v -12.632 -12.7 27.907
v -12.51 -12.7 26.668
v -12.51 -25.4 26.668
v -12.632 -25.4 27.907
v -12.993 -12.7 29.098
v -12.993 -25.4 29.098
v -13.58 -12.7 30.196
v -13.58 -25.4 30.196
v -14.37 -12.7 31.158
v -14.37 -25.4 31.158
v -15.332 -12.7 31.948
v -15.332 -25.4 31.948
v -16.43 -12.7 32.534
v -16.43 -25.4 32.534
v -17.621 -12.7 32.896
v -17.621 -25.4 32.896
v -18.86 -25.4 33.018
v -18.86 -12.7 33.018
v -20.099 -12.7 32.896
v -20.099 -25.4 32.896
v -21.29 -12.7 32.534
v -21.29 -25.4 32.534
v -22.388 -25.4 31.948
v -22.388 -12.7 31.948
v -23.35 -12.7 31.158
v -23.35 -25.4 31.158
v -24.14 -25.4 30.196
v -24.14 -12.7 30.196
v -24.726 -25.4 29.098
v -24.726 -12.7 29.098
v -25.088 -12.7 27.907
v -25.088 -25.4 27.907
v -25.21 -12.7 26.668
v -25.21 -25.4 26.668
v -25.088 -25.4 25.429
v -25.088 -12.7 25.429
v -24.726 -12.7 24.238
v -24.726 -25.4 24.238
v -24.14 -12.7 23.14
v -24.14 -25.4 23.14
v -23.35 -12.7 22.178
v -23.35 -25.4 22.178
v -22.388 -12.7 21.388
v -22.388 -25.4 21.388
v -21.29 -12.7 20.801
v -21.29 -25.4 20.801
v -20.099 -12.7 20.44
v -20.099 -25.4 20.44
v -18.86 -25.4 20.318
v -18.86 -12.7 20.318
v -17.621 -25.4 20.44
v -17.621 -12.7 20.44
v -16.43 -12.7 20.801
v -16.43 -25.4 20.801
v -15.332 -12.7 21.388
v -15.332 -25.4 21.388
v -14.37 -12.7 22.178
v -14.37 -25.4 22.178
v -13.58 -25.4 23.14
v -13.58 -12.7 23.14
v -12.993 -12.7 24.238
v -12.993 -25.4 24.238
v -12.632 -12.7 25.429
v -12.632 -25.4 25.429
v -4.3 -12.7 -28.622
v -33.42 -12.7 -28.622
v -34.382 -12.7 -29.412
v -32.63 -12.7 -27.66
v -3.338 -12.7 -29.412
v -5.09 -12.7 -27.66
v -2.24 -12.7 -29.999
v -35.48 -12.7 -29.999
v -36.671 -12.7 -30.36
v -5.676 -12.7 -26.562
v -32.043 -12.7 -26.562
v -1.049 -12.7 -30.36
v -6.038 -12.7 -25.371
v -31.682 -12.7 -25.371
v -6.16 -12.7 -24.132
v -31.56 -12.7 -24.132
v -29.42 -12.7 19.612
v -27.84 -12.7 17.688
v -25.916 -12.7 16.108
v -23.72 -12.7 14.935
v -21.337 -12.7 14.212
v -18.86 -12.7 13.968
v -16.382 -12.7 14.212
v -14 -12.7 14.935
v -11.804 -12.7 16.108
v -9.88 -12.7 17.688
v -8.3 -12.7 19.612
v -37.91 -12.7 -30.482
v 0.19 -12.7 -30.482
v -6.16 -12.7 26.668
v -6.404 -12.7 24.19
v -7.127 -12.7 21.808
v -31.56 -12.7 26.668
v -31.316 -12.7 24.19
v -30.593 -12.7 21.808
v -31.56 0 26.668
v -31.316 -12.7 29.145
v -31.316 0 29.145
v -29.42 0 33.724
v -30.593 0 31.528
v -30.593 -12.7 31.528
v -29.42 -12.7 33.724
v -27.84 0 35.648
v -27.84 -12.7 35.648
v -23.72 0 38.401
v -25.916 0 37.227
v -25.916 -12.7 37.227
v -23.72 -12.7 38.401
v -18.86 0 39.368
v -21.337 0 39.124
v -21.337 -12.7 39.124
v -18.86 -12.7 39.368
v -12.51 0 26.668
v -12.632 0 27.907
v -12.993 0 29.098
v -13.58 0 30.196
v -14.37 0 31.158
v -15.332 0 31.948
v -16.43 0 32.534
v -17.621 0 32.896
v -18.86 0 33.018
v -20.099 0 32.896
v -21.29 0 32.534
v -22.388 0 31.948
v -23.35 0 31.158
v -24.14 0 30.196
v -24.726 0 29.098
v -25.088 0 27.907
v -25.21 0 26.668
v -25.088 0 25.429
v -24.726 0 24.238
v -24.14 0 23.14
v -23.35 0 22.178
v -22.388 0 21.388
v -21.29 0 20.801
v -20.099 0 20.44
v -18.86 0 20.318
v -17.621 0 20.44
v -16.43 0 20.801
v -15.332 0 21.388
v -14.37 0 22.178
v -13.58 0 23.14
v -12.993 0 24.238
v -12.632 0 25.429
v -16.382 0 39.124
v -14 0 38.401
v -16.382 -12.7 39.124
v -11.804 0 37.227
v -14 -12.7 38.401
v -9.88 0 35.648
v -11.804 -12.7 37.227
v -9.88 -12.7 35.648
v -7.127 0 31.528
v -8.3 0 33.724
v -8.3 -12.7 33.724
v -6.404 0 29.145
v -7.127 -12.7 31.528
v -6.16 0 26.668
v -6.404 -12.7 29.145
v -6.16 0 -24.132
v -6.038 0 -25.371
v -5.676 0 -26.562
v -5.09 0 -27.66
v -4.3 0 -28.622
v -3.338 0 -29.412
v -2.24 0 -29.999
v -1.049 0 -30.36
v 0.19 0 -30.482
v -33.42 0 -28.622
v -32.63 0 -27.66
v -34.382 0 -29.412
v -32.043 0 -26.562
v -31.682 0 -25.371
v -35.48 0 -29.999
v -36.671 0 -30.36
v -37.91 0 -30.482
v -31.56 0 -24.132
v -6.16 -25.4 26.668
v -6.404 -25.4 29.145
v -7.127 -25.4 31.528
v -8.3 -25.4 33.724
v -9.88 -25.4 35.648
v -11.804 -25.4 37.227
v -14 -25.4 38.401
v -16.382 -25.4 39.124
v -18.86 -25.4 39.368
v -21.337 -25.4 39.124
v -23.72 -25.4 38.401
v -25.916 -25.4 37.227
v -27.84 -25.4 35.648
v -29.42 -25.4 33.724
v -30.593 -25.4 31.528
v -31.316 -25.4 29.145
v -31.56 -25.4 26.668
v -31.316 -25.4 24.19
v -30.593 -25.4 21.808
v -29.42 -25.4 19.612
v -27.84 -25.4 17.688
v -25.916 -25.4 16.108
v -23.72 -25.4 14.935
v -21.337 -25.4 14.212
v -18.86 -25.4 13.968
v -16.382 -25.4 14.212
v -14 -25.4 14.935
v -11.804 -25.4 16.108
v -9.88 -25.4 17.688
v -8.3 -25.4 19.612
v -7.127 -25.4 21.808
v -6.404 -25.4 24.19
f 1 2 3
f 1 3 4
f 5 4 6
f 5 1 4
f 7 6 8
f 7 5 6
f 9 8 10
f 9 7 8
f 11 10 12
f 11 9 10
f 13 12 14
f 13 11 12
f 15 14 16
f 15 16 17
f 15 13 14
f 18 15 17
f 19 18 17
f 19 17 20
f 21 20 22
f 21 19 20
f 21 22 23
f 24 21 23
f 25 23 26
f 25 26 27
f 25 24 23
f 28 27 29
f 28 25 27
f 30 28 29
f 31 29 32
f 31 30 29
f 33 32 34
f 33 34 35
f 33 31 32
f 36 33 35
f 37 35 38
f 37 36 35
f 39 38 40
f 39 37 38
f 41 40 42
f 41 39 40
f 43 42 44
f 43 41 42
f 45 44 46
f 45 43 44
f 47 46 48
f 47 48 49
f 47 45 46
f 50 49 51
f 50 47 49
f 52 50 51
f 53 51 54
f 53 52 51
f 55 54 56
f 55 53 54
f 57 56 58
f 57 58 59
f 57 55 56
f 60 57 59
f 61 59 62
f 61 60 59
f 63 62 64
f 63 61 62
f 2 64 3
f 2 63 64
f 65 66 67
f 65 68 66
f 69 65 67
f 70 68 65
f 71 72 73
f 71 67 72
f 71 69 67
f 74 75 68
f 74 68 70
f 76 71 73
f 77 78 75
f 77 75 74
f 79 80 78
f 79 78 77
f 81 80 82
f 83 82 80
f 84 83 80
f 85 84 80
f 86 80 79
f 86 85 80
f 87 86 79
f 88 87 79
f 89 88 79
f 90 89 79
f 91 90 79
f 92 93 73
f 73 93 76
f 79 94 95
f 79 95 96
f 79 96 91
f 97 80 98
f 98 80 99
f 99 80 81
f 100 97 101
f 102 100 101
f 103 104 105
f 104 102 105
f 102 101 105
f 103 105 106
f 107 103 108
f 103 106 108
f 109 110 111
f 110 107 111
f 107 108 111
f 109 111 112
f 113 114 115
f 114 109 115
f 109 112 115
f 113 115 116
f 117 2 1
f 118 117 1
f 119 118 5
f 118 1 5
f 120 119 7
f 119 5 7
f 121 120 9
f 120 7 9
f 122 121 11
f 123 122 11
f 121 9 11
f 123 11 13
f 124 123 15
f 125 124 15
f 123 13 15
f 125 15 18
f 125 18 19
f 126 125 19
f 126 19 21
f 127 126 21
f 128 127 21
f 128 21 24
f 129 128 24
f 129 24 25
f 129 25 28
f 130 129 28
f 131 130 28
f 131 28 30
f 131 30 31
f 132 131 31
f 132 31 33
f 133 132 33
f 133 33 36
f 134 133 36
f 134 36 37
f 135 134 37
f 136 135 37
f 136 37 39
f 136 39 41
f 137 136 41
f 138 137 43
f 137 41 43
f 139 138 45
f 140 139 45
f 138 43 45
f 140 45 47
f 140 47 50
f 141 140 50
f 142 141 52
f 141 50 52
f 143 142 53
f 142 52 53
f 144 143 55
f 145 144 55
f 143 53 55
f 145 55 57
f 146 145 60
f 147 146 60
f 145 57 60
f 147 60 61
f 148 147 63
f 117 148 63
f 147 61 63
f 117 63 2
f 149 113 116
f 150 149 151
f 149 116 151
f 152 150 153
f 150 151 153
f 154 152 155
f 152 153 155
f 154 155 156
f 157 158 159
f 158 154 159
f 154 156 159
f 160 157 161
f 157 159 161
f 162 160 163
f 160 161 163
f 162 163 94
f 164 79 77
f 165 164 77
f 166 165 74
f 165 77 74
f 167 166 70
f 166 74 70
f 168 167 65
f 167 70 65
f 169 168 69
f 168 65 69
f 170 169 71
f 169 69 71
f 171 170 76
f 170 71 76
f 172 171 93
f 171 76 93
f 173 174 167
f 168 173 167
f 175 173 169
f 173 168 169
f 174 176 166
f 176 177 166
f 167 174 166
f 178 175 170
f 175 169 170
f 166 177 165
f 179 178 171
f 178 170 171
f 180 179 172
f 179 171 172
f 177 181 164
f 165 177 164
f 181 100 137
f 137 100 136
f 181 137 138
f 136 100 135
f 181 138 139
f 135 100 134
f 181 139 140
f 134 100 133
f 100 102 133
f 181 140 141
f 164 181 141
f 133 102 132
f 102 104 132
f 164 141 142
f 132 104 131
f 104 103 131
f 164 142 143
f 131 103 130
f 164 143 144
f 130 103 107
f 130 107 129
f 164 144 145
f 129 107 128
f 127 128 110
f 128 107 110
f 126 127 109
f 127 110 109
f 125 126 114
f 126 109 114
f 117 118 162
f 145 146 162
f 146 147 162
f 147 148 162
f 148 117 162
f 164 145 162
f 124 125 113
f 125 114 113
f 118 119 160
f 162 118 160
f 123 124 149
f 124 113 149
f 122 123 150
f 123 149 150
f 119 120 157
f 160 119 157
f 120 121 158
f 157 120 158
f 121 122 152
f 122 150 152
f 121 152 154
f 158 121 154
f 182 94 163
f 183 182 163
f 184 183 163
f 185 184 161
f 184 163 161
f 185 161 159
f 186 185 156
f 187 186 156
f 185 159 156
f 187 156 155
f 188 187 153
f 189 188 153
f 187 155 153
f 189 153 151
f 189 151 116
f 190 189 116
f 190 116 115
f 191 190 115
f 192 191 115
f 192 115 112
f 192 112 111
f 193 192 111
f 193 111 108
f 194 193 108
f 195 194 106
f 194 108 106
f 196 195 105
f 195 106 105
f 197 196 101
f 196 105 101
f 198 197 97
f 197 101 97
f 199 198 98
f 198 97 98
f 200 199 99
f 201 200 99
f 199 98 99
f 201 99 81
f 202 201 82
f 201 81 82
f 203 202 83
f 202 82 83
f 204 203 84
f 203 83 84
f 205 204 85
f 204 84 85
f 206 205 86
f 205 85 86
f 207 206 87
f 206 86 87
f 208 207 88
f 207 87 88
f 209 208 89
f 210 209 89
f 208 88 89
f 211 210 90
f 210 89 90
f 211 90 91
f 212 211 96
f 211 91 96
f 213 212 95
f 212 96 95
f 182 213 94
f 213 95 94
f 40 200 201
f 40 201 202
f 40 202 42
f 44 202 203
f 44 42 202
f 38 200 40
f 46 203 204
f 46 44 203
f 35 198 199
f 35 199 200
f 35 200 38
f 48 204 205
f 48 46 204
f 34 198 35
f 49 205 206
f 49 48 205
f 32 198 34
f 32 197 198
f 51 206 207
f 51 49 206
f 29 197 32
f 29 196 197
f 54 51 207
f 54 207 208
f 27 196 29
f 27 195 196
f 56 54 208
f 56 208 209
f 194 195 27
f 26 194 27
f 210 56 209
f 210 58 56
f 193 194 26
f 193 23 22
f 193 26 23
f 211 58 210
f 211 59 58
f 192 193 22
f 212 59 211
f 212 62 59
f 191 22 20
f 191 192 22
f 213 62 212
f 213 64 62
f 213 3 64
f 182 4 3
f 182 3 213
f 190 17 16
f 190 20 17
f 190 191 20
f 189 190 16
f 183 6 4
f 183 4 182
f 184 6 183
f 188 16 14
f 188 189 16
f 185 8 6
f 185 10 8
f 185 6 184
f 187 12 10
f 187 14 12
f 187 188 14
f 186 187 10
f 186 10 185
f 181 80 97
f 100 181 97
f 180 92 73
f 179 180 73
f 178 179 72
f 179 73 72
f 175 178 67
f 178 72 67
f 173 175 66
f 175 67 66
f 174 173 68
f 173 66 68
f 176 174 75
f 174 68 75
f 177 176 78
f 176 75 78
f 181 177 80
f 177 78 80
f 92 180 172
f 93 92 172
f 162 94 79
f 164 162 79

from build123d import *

# Parameters (mm, degrees)
F0_W     = 50.8
F0_H     = 69.85
F1_DEPTH = 12.7
F2_R     = 6.35
F3_DEPTH = 31.75
F4_DEPTH = 12.7


with BuildPart() as f1:
    # F0 (on Front) → F1 (new body)
    with BuildSketch(Plane.XZ):
        with Locations((-18.859848, 4.442824)):
            Rectangle(F0_W, F0_H)
    extrude(amount=F1_DEPTH)

    # F2 (on face) → F3 (cut)
    with BuildSketch(Plane.XZ.offset(12.7)):
        with BuildLine():
            Line((-31.559848, -24.132176), (-31.559848, 26.667824))
            ThreePointArc((-31.559848, 26.667824), (-27.840104, 35.64808), (-18.859848, 39.367824))
            Line((-18.859848, 39.367824), (-44.259848, 39.367824))
            Line((-44.259848, 39.367824), (-44.259848, -30.482176))
            Line((-44.259848, -30.482176), (-37.909848, -30.482176))
            ThreePointArc((-37.909848, -30.482176), (-33.41972, -28.622304), (-31.559848, -24.132176))
        make_face()
        with Locations((-18.859848, 26.667824)):
            Circle(F2_R)
        with BuildLine():
            ThreePointArc((-18.859848, 39.367824), (-9.879591, 35.64808), (-6.159848, 26.667824))
            Line((-6.159848, 26.667824), (-6.159848, -24.132176))
            ThreePointArc((-6.159848, -24.132176), (-4.299976, -28.622304), (0.190152, -30.482176))
            Line((0.190152, -30.482176), (6.540152, -30.482176))
            Line((6.540152, -30.482176), (6.540152, 39.367824))
            Line((6.540152, 39.367824), (-18.859848, 39.367824))
        make_face()
    extrude(amount=-F3_DEPTH, mode=Mode.SUBTRACT)

    # F2 (on face) → F4 (join)
    with BuildSketch(Plane.XZ.offset(12.7)):
        with BuildLine():
            ThreePointArc((-31.559848, 26.667824), (-18.859848, 13.967824), (-6.159848, 26.667824))
            ThreePointArc((-6.159848, 26.667824), (-18.859848, 39.367824), (-31.559848, 26.667824))
        make_face()
        with Locations((-18.859848, 26.667824)):
            Circle(F2_R, mode=Mode.SUBTRACT)
    extrude(amount=F4_DEPTH)


solid = f1.part
